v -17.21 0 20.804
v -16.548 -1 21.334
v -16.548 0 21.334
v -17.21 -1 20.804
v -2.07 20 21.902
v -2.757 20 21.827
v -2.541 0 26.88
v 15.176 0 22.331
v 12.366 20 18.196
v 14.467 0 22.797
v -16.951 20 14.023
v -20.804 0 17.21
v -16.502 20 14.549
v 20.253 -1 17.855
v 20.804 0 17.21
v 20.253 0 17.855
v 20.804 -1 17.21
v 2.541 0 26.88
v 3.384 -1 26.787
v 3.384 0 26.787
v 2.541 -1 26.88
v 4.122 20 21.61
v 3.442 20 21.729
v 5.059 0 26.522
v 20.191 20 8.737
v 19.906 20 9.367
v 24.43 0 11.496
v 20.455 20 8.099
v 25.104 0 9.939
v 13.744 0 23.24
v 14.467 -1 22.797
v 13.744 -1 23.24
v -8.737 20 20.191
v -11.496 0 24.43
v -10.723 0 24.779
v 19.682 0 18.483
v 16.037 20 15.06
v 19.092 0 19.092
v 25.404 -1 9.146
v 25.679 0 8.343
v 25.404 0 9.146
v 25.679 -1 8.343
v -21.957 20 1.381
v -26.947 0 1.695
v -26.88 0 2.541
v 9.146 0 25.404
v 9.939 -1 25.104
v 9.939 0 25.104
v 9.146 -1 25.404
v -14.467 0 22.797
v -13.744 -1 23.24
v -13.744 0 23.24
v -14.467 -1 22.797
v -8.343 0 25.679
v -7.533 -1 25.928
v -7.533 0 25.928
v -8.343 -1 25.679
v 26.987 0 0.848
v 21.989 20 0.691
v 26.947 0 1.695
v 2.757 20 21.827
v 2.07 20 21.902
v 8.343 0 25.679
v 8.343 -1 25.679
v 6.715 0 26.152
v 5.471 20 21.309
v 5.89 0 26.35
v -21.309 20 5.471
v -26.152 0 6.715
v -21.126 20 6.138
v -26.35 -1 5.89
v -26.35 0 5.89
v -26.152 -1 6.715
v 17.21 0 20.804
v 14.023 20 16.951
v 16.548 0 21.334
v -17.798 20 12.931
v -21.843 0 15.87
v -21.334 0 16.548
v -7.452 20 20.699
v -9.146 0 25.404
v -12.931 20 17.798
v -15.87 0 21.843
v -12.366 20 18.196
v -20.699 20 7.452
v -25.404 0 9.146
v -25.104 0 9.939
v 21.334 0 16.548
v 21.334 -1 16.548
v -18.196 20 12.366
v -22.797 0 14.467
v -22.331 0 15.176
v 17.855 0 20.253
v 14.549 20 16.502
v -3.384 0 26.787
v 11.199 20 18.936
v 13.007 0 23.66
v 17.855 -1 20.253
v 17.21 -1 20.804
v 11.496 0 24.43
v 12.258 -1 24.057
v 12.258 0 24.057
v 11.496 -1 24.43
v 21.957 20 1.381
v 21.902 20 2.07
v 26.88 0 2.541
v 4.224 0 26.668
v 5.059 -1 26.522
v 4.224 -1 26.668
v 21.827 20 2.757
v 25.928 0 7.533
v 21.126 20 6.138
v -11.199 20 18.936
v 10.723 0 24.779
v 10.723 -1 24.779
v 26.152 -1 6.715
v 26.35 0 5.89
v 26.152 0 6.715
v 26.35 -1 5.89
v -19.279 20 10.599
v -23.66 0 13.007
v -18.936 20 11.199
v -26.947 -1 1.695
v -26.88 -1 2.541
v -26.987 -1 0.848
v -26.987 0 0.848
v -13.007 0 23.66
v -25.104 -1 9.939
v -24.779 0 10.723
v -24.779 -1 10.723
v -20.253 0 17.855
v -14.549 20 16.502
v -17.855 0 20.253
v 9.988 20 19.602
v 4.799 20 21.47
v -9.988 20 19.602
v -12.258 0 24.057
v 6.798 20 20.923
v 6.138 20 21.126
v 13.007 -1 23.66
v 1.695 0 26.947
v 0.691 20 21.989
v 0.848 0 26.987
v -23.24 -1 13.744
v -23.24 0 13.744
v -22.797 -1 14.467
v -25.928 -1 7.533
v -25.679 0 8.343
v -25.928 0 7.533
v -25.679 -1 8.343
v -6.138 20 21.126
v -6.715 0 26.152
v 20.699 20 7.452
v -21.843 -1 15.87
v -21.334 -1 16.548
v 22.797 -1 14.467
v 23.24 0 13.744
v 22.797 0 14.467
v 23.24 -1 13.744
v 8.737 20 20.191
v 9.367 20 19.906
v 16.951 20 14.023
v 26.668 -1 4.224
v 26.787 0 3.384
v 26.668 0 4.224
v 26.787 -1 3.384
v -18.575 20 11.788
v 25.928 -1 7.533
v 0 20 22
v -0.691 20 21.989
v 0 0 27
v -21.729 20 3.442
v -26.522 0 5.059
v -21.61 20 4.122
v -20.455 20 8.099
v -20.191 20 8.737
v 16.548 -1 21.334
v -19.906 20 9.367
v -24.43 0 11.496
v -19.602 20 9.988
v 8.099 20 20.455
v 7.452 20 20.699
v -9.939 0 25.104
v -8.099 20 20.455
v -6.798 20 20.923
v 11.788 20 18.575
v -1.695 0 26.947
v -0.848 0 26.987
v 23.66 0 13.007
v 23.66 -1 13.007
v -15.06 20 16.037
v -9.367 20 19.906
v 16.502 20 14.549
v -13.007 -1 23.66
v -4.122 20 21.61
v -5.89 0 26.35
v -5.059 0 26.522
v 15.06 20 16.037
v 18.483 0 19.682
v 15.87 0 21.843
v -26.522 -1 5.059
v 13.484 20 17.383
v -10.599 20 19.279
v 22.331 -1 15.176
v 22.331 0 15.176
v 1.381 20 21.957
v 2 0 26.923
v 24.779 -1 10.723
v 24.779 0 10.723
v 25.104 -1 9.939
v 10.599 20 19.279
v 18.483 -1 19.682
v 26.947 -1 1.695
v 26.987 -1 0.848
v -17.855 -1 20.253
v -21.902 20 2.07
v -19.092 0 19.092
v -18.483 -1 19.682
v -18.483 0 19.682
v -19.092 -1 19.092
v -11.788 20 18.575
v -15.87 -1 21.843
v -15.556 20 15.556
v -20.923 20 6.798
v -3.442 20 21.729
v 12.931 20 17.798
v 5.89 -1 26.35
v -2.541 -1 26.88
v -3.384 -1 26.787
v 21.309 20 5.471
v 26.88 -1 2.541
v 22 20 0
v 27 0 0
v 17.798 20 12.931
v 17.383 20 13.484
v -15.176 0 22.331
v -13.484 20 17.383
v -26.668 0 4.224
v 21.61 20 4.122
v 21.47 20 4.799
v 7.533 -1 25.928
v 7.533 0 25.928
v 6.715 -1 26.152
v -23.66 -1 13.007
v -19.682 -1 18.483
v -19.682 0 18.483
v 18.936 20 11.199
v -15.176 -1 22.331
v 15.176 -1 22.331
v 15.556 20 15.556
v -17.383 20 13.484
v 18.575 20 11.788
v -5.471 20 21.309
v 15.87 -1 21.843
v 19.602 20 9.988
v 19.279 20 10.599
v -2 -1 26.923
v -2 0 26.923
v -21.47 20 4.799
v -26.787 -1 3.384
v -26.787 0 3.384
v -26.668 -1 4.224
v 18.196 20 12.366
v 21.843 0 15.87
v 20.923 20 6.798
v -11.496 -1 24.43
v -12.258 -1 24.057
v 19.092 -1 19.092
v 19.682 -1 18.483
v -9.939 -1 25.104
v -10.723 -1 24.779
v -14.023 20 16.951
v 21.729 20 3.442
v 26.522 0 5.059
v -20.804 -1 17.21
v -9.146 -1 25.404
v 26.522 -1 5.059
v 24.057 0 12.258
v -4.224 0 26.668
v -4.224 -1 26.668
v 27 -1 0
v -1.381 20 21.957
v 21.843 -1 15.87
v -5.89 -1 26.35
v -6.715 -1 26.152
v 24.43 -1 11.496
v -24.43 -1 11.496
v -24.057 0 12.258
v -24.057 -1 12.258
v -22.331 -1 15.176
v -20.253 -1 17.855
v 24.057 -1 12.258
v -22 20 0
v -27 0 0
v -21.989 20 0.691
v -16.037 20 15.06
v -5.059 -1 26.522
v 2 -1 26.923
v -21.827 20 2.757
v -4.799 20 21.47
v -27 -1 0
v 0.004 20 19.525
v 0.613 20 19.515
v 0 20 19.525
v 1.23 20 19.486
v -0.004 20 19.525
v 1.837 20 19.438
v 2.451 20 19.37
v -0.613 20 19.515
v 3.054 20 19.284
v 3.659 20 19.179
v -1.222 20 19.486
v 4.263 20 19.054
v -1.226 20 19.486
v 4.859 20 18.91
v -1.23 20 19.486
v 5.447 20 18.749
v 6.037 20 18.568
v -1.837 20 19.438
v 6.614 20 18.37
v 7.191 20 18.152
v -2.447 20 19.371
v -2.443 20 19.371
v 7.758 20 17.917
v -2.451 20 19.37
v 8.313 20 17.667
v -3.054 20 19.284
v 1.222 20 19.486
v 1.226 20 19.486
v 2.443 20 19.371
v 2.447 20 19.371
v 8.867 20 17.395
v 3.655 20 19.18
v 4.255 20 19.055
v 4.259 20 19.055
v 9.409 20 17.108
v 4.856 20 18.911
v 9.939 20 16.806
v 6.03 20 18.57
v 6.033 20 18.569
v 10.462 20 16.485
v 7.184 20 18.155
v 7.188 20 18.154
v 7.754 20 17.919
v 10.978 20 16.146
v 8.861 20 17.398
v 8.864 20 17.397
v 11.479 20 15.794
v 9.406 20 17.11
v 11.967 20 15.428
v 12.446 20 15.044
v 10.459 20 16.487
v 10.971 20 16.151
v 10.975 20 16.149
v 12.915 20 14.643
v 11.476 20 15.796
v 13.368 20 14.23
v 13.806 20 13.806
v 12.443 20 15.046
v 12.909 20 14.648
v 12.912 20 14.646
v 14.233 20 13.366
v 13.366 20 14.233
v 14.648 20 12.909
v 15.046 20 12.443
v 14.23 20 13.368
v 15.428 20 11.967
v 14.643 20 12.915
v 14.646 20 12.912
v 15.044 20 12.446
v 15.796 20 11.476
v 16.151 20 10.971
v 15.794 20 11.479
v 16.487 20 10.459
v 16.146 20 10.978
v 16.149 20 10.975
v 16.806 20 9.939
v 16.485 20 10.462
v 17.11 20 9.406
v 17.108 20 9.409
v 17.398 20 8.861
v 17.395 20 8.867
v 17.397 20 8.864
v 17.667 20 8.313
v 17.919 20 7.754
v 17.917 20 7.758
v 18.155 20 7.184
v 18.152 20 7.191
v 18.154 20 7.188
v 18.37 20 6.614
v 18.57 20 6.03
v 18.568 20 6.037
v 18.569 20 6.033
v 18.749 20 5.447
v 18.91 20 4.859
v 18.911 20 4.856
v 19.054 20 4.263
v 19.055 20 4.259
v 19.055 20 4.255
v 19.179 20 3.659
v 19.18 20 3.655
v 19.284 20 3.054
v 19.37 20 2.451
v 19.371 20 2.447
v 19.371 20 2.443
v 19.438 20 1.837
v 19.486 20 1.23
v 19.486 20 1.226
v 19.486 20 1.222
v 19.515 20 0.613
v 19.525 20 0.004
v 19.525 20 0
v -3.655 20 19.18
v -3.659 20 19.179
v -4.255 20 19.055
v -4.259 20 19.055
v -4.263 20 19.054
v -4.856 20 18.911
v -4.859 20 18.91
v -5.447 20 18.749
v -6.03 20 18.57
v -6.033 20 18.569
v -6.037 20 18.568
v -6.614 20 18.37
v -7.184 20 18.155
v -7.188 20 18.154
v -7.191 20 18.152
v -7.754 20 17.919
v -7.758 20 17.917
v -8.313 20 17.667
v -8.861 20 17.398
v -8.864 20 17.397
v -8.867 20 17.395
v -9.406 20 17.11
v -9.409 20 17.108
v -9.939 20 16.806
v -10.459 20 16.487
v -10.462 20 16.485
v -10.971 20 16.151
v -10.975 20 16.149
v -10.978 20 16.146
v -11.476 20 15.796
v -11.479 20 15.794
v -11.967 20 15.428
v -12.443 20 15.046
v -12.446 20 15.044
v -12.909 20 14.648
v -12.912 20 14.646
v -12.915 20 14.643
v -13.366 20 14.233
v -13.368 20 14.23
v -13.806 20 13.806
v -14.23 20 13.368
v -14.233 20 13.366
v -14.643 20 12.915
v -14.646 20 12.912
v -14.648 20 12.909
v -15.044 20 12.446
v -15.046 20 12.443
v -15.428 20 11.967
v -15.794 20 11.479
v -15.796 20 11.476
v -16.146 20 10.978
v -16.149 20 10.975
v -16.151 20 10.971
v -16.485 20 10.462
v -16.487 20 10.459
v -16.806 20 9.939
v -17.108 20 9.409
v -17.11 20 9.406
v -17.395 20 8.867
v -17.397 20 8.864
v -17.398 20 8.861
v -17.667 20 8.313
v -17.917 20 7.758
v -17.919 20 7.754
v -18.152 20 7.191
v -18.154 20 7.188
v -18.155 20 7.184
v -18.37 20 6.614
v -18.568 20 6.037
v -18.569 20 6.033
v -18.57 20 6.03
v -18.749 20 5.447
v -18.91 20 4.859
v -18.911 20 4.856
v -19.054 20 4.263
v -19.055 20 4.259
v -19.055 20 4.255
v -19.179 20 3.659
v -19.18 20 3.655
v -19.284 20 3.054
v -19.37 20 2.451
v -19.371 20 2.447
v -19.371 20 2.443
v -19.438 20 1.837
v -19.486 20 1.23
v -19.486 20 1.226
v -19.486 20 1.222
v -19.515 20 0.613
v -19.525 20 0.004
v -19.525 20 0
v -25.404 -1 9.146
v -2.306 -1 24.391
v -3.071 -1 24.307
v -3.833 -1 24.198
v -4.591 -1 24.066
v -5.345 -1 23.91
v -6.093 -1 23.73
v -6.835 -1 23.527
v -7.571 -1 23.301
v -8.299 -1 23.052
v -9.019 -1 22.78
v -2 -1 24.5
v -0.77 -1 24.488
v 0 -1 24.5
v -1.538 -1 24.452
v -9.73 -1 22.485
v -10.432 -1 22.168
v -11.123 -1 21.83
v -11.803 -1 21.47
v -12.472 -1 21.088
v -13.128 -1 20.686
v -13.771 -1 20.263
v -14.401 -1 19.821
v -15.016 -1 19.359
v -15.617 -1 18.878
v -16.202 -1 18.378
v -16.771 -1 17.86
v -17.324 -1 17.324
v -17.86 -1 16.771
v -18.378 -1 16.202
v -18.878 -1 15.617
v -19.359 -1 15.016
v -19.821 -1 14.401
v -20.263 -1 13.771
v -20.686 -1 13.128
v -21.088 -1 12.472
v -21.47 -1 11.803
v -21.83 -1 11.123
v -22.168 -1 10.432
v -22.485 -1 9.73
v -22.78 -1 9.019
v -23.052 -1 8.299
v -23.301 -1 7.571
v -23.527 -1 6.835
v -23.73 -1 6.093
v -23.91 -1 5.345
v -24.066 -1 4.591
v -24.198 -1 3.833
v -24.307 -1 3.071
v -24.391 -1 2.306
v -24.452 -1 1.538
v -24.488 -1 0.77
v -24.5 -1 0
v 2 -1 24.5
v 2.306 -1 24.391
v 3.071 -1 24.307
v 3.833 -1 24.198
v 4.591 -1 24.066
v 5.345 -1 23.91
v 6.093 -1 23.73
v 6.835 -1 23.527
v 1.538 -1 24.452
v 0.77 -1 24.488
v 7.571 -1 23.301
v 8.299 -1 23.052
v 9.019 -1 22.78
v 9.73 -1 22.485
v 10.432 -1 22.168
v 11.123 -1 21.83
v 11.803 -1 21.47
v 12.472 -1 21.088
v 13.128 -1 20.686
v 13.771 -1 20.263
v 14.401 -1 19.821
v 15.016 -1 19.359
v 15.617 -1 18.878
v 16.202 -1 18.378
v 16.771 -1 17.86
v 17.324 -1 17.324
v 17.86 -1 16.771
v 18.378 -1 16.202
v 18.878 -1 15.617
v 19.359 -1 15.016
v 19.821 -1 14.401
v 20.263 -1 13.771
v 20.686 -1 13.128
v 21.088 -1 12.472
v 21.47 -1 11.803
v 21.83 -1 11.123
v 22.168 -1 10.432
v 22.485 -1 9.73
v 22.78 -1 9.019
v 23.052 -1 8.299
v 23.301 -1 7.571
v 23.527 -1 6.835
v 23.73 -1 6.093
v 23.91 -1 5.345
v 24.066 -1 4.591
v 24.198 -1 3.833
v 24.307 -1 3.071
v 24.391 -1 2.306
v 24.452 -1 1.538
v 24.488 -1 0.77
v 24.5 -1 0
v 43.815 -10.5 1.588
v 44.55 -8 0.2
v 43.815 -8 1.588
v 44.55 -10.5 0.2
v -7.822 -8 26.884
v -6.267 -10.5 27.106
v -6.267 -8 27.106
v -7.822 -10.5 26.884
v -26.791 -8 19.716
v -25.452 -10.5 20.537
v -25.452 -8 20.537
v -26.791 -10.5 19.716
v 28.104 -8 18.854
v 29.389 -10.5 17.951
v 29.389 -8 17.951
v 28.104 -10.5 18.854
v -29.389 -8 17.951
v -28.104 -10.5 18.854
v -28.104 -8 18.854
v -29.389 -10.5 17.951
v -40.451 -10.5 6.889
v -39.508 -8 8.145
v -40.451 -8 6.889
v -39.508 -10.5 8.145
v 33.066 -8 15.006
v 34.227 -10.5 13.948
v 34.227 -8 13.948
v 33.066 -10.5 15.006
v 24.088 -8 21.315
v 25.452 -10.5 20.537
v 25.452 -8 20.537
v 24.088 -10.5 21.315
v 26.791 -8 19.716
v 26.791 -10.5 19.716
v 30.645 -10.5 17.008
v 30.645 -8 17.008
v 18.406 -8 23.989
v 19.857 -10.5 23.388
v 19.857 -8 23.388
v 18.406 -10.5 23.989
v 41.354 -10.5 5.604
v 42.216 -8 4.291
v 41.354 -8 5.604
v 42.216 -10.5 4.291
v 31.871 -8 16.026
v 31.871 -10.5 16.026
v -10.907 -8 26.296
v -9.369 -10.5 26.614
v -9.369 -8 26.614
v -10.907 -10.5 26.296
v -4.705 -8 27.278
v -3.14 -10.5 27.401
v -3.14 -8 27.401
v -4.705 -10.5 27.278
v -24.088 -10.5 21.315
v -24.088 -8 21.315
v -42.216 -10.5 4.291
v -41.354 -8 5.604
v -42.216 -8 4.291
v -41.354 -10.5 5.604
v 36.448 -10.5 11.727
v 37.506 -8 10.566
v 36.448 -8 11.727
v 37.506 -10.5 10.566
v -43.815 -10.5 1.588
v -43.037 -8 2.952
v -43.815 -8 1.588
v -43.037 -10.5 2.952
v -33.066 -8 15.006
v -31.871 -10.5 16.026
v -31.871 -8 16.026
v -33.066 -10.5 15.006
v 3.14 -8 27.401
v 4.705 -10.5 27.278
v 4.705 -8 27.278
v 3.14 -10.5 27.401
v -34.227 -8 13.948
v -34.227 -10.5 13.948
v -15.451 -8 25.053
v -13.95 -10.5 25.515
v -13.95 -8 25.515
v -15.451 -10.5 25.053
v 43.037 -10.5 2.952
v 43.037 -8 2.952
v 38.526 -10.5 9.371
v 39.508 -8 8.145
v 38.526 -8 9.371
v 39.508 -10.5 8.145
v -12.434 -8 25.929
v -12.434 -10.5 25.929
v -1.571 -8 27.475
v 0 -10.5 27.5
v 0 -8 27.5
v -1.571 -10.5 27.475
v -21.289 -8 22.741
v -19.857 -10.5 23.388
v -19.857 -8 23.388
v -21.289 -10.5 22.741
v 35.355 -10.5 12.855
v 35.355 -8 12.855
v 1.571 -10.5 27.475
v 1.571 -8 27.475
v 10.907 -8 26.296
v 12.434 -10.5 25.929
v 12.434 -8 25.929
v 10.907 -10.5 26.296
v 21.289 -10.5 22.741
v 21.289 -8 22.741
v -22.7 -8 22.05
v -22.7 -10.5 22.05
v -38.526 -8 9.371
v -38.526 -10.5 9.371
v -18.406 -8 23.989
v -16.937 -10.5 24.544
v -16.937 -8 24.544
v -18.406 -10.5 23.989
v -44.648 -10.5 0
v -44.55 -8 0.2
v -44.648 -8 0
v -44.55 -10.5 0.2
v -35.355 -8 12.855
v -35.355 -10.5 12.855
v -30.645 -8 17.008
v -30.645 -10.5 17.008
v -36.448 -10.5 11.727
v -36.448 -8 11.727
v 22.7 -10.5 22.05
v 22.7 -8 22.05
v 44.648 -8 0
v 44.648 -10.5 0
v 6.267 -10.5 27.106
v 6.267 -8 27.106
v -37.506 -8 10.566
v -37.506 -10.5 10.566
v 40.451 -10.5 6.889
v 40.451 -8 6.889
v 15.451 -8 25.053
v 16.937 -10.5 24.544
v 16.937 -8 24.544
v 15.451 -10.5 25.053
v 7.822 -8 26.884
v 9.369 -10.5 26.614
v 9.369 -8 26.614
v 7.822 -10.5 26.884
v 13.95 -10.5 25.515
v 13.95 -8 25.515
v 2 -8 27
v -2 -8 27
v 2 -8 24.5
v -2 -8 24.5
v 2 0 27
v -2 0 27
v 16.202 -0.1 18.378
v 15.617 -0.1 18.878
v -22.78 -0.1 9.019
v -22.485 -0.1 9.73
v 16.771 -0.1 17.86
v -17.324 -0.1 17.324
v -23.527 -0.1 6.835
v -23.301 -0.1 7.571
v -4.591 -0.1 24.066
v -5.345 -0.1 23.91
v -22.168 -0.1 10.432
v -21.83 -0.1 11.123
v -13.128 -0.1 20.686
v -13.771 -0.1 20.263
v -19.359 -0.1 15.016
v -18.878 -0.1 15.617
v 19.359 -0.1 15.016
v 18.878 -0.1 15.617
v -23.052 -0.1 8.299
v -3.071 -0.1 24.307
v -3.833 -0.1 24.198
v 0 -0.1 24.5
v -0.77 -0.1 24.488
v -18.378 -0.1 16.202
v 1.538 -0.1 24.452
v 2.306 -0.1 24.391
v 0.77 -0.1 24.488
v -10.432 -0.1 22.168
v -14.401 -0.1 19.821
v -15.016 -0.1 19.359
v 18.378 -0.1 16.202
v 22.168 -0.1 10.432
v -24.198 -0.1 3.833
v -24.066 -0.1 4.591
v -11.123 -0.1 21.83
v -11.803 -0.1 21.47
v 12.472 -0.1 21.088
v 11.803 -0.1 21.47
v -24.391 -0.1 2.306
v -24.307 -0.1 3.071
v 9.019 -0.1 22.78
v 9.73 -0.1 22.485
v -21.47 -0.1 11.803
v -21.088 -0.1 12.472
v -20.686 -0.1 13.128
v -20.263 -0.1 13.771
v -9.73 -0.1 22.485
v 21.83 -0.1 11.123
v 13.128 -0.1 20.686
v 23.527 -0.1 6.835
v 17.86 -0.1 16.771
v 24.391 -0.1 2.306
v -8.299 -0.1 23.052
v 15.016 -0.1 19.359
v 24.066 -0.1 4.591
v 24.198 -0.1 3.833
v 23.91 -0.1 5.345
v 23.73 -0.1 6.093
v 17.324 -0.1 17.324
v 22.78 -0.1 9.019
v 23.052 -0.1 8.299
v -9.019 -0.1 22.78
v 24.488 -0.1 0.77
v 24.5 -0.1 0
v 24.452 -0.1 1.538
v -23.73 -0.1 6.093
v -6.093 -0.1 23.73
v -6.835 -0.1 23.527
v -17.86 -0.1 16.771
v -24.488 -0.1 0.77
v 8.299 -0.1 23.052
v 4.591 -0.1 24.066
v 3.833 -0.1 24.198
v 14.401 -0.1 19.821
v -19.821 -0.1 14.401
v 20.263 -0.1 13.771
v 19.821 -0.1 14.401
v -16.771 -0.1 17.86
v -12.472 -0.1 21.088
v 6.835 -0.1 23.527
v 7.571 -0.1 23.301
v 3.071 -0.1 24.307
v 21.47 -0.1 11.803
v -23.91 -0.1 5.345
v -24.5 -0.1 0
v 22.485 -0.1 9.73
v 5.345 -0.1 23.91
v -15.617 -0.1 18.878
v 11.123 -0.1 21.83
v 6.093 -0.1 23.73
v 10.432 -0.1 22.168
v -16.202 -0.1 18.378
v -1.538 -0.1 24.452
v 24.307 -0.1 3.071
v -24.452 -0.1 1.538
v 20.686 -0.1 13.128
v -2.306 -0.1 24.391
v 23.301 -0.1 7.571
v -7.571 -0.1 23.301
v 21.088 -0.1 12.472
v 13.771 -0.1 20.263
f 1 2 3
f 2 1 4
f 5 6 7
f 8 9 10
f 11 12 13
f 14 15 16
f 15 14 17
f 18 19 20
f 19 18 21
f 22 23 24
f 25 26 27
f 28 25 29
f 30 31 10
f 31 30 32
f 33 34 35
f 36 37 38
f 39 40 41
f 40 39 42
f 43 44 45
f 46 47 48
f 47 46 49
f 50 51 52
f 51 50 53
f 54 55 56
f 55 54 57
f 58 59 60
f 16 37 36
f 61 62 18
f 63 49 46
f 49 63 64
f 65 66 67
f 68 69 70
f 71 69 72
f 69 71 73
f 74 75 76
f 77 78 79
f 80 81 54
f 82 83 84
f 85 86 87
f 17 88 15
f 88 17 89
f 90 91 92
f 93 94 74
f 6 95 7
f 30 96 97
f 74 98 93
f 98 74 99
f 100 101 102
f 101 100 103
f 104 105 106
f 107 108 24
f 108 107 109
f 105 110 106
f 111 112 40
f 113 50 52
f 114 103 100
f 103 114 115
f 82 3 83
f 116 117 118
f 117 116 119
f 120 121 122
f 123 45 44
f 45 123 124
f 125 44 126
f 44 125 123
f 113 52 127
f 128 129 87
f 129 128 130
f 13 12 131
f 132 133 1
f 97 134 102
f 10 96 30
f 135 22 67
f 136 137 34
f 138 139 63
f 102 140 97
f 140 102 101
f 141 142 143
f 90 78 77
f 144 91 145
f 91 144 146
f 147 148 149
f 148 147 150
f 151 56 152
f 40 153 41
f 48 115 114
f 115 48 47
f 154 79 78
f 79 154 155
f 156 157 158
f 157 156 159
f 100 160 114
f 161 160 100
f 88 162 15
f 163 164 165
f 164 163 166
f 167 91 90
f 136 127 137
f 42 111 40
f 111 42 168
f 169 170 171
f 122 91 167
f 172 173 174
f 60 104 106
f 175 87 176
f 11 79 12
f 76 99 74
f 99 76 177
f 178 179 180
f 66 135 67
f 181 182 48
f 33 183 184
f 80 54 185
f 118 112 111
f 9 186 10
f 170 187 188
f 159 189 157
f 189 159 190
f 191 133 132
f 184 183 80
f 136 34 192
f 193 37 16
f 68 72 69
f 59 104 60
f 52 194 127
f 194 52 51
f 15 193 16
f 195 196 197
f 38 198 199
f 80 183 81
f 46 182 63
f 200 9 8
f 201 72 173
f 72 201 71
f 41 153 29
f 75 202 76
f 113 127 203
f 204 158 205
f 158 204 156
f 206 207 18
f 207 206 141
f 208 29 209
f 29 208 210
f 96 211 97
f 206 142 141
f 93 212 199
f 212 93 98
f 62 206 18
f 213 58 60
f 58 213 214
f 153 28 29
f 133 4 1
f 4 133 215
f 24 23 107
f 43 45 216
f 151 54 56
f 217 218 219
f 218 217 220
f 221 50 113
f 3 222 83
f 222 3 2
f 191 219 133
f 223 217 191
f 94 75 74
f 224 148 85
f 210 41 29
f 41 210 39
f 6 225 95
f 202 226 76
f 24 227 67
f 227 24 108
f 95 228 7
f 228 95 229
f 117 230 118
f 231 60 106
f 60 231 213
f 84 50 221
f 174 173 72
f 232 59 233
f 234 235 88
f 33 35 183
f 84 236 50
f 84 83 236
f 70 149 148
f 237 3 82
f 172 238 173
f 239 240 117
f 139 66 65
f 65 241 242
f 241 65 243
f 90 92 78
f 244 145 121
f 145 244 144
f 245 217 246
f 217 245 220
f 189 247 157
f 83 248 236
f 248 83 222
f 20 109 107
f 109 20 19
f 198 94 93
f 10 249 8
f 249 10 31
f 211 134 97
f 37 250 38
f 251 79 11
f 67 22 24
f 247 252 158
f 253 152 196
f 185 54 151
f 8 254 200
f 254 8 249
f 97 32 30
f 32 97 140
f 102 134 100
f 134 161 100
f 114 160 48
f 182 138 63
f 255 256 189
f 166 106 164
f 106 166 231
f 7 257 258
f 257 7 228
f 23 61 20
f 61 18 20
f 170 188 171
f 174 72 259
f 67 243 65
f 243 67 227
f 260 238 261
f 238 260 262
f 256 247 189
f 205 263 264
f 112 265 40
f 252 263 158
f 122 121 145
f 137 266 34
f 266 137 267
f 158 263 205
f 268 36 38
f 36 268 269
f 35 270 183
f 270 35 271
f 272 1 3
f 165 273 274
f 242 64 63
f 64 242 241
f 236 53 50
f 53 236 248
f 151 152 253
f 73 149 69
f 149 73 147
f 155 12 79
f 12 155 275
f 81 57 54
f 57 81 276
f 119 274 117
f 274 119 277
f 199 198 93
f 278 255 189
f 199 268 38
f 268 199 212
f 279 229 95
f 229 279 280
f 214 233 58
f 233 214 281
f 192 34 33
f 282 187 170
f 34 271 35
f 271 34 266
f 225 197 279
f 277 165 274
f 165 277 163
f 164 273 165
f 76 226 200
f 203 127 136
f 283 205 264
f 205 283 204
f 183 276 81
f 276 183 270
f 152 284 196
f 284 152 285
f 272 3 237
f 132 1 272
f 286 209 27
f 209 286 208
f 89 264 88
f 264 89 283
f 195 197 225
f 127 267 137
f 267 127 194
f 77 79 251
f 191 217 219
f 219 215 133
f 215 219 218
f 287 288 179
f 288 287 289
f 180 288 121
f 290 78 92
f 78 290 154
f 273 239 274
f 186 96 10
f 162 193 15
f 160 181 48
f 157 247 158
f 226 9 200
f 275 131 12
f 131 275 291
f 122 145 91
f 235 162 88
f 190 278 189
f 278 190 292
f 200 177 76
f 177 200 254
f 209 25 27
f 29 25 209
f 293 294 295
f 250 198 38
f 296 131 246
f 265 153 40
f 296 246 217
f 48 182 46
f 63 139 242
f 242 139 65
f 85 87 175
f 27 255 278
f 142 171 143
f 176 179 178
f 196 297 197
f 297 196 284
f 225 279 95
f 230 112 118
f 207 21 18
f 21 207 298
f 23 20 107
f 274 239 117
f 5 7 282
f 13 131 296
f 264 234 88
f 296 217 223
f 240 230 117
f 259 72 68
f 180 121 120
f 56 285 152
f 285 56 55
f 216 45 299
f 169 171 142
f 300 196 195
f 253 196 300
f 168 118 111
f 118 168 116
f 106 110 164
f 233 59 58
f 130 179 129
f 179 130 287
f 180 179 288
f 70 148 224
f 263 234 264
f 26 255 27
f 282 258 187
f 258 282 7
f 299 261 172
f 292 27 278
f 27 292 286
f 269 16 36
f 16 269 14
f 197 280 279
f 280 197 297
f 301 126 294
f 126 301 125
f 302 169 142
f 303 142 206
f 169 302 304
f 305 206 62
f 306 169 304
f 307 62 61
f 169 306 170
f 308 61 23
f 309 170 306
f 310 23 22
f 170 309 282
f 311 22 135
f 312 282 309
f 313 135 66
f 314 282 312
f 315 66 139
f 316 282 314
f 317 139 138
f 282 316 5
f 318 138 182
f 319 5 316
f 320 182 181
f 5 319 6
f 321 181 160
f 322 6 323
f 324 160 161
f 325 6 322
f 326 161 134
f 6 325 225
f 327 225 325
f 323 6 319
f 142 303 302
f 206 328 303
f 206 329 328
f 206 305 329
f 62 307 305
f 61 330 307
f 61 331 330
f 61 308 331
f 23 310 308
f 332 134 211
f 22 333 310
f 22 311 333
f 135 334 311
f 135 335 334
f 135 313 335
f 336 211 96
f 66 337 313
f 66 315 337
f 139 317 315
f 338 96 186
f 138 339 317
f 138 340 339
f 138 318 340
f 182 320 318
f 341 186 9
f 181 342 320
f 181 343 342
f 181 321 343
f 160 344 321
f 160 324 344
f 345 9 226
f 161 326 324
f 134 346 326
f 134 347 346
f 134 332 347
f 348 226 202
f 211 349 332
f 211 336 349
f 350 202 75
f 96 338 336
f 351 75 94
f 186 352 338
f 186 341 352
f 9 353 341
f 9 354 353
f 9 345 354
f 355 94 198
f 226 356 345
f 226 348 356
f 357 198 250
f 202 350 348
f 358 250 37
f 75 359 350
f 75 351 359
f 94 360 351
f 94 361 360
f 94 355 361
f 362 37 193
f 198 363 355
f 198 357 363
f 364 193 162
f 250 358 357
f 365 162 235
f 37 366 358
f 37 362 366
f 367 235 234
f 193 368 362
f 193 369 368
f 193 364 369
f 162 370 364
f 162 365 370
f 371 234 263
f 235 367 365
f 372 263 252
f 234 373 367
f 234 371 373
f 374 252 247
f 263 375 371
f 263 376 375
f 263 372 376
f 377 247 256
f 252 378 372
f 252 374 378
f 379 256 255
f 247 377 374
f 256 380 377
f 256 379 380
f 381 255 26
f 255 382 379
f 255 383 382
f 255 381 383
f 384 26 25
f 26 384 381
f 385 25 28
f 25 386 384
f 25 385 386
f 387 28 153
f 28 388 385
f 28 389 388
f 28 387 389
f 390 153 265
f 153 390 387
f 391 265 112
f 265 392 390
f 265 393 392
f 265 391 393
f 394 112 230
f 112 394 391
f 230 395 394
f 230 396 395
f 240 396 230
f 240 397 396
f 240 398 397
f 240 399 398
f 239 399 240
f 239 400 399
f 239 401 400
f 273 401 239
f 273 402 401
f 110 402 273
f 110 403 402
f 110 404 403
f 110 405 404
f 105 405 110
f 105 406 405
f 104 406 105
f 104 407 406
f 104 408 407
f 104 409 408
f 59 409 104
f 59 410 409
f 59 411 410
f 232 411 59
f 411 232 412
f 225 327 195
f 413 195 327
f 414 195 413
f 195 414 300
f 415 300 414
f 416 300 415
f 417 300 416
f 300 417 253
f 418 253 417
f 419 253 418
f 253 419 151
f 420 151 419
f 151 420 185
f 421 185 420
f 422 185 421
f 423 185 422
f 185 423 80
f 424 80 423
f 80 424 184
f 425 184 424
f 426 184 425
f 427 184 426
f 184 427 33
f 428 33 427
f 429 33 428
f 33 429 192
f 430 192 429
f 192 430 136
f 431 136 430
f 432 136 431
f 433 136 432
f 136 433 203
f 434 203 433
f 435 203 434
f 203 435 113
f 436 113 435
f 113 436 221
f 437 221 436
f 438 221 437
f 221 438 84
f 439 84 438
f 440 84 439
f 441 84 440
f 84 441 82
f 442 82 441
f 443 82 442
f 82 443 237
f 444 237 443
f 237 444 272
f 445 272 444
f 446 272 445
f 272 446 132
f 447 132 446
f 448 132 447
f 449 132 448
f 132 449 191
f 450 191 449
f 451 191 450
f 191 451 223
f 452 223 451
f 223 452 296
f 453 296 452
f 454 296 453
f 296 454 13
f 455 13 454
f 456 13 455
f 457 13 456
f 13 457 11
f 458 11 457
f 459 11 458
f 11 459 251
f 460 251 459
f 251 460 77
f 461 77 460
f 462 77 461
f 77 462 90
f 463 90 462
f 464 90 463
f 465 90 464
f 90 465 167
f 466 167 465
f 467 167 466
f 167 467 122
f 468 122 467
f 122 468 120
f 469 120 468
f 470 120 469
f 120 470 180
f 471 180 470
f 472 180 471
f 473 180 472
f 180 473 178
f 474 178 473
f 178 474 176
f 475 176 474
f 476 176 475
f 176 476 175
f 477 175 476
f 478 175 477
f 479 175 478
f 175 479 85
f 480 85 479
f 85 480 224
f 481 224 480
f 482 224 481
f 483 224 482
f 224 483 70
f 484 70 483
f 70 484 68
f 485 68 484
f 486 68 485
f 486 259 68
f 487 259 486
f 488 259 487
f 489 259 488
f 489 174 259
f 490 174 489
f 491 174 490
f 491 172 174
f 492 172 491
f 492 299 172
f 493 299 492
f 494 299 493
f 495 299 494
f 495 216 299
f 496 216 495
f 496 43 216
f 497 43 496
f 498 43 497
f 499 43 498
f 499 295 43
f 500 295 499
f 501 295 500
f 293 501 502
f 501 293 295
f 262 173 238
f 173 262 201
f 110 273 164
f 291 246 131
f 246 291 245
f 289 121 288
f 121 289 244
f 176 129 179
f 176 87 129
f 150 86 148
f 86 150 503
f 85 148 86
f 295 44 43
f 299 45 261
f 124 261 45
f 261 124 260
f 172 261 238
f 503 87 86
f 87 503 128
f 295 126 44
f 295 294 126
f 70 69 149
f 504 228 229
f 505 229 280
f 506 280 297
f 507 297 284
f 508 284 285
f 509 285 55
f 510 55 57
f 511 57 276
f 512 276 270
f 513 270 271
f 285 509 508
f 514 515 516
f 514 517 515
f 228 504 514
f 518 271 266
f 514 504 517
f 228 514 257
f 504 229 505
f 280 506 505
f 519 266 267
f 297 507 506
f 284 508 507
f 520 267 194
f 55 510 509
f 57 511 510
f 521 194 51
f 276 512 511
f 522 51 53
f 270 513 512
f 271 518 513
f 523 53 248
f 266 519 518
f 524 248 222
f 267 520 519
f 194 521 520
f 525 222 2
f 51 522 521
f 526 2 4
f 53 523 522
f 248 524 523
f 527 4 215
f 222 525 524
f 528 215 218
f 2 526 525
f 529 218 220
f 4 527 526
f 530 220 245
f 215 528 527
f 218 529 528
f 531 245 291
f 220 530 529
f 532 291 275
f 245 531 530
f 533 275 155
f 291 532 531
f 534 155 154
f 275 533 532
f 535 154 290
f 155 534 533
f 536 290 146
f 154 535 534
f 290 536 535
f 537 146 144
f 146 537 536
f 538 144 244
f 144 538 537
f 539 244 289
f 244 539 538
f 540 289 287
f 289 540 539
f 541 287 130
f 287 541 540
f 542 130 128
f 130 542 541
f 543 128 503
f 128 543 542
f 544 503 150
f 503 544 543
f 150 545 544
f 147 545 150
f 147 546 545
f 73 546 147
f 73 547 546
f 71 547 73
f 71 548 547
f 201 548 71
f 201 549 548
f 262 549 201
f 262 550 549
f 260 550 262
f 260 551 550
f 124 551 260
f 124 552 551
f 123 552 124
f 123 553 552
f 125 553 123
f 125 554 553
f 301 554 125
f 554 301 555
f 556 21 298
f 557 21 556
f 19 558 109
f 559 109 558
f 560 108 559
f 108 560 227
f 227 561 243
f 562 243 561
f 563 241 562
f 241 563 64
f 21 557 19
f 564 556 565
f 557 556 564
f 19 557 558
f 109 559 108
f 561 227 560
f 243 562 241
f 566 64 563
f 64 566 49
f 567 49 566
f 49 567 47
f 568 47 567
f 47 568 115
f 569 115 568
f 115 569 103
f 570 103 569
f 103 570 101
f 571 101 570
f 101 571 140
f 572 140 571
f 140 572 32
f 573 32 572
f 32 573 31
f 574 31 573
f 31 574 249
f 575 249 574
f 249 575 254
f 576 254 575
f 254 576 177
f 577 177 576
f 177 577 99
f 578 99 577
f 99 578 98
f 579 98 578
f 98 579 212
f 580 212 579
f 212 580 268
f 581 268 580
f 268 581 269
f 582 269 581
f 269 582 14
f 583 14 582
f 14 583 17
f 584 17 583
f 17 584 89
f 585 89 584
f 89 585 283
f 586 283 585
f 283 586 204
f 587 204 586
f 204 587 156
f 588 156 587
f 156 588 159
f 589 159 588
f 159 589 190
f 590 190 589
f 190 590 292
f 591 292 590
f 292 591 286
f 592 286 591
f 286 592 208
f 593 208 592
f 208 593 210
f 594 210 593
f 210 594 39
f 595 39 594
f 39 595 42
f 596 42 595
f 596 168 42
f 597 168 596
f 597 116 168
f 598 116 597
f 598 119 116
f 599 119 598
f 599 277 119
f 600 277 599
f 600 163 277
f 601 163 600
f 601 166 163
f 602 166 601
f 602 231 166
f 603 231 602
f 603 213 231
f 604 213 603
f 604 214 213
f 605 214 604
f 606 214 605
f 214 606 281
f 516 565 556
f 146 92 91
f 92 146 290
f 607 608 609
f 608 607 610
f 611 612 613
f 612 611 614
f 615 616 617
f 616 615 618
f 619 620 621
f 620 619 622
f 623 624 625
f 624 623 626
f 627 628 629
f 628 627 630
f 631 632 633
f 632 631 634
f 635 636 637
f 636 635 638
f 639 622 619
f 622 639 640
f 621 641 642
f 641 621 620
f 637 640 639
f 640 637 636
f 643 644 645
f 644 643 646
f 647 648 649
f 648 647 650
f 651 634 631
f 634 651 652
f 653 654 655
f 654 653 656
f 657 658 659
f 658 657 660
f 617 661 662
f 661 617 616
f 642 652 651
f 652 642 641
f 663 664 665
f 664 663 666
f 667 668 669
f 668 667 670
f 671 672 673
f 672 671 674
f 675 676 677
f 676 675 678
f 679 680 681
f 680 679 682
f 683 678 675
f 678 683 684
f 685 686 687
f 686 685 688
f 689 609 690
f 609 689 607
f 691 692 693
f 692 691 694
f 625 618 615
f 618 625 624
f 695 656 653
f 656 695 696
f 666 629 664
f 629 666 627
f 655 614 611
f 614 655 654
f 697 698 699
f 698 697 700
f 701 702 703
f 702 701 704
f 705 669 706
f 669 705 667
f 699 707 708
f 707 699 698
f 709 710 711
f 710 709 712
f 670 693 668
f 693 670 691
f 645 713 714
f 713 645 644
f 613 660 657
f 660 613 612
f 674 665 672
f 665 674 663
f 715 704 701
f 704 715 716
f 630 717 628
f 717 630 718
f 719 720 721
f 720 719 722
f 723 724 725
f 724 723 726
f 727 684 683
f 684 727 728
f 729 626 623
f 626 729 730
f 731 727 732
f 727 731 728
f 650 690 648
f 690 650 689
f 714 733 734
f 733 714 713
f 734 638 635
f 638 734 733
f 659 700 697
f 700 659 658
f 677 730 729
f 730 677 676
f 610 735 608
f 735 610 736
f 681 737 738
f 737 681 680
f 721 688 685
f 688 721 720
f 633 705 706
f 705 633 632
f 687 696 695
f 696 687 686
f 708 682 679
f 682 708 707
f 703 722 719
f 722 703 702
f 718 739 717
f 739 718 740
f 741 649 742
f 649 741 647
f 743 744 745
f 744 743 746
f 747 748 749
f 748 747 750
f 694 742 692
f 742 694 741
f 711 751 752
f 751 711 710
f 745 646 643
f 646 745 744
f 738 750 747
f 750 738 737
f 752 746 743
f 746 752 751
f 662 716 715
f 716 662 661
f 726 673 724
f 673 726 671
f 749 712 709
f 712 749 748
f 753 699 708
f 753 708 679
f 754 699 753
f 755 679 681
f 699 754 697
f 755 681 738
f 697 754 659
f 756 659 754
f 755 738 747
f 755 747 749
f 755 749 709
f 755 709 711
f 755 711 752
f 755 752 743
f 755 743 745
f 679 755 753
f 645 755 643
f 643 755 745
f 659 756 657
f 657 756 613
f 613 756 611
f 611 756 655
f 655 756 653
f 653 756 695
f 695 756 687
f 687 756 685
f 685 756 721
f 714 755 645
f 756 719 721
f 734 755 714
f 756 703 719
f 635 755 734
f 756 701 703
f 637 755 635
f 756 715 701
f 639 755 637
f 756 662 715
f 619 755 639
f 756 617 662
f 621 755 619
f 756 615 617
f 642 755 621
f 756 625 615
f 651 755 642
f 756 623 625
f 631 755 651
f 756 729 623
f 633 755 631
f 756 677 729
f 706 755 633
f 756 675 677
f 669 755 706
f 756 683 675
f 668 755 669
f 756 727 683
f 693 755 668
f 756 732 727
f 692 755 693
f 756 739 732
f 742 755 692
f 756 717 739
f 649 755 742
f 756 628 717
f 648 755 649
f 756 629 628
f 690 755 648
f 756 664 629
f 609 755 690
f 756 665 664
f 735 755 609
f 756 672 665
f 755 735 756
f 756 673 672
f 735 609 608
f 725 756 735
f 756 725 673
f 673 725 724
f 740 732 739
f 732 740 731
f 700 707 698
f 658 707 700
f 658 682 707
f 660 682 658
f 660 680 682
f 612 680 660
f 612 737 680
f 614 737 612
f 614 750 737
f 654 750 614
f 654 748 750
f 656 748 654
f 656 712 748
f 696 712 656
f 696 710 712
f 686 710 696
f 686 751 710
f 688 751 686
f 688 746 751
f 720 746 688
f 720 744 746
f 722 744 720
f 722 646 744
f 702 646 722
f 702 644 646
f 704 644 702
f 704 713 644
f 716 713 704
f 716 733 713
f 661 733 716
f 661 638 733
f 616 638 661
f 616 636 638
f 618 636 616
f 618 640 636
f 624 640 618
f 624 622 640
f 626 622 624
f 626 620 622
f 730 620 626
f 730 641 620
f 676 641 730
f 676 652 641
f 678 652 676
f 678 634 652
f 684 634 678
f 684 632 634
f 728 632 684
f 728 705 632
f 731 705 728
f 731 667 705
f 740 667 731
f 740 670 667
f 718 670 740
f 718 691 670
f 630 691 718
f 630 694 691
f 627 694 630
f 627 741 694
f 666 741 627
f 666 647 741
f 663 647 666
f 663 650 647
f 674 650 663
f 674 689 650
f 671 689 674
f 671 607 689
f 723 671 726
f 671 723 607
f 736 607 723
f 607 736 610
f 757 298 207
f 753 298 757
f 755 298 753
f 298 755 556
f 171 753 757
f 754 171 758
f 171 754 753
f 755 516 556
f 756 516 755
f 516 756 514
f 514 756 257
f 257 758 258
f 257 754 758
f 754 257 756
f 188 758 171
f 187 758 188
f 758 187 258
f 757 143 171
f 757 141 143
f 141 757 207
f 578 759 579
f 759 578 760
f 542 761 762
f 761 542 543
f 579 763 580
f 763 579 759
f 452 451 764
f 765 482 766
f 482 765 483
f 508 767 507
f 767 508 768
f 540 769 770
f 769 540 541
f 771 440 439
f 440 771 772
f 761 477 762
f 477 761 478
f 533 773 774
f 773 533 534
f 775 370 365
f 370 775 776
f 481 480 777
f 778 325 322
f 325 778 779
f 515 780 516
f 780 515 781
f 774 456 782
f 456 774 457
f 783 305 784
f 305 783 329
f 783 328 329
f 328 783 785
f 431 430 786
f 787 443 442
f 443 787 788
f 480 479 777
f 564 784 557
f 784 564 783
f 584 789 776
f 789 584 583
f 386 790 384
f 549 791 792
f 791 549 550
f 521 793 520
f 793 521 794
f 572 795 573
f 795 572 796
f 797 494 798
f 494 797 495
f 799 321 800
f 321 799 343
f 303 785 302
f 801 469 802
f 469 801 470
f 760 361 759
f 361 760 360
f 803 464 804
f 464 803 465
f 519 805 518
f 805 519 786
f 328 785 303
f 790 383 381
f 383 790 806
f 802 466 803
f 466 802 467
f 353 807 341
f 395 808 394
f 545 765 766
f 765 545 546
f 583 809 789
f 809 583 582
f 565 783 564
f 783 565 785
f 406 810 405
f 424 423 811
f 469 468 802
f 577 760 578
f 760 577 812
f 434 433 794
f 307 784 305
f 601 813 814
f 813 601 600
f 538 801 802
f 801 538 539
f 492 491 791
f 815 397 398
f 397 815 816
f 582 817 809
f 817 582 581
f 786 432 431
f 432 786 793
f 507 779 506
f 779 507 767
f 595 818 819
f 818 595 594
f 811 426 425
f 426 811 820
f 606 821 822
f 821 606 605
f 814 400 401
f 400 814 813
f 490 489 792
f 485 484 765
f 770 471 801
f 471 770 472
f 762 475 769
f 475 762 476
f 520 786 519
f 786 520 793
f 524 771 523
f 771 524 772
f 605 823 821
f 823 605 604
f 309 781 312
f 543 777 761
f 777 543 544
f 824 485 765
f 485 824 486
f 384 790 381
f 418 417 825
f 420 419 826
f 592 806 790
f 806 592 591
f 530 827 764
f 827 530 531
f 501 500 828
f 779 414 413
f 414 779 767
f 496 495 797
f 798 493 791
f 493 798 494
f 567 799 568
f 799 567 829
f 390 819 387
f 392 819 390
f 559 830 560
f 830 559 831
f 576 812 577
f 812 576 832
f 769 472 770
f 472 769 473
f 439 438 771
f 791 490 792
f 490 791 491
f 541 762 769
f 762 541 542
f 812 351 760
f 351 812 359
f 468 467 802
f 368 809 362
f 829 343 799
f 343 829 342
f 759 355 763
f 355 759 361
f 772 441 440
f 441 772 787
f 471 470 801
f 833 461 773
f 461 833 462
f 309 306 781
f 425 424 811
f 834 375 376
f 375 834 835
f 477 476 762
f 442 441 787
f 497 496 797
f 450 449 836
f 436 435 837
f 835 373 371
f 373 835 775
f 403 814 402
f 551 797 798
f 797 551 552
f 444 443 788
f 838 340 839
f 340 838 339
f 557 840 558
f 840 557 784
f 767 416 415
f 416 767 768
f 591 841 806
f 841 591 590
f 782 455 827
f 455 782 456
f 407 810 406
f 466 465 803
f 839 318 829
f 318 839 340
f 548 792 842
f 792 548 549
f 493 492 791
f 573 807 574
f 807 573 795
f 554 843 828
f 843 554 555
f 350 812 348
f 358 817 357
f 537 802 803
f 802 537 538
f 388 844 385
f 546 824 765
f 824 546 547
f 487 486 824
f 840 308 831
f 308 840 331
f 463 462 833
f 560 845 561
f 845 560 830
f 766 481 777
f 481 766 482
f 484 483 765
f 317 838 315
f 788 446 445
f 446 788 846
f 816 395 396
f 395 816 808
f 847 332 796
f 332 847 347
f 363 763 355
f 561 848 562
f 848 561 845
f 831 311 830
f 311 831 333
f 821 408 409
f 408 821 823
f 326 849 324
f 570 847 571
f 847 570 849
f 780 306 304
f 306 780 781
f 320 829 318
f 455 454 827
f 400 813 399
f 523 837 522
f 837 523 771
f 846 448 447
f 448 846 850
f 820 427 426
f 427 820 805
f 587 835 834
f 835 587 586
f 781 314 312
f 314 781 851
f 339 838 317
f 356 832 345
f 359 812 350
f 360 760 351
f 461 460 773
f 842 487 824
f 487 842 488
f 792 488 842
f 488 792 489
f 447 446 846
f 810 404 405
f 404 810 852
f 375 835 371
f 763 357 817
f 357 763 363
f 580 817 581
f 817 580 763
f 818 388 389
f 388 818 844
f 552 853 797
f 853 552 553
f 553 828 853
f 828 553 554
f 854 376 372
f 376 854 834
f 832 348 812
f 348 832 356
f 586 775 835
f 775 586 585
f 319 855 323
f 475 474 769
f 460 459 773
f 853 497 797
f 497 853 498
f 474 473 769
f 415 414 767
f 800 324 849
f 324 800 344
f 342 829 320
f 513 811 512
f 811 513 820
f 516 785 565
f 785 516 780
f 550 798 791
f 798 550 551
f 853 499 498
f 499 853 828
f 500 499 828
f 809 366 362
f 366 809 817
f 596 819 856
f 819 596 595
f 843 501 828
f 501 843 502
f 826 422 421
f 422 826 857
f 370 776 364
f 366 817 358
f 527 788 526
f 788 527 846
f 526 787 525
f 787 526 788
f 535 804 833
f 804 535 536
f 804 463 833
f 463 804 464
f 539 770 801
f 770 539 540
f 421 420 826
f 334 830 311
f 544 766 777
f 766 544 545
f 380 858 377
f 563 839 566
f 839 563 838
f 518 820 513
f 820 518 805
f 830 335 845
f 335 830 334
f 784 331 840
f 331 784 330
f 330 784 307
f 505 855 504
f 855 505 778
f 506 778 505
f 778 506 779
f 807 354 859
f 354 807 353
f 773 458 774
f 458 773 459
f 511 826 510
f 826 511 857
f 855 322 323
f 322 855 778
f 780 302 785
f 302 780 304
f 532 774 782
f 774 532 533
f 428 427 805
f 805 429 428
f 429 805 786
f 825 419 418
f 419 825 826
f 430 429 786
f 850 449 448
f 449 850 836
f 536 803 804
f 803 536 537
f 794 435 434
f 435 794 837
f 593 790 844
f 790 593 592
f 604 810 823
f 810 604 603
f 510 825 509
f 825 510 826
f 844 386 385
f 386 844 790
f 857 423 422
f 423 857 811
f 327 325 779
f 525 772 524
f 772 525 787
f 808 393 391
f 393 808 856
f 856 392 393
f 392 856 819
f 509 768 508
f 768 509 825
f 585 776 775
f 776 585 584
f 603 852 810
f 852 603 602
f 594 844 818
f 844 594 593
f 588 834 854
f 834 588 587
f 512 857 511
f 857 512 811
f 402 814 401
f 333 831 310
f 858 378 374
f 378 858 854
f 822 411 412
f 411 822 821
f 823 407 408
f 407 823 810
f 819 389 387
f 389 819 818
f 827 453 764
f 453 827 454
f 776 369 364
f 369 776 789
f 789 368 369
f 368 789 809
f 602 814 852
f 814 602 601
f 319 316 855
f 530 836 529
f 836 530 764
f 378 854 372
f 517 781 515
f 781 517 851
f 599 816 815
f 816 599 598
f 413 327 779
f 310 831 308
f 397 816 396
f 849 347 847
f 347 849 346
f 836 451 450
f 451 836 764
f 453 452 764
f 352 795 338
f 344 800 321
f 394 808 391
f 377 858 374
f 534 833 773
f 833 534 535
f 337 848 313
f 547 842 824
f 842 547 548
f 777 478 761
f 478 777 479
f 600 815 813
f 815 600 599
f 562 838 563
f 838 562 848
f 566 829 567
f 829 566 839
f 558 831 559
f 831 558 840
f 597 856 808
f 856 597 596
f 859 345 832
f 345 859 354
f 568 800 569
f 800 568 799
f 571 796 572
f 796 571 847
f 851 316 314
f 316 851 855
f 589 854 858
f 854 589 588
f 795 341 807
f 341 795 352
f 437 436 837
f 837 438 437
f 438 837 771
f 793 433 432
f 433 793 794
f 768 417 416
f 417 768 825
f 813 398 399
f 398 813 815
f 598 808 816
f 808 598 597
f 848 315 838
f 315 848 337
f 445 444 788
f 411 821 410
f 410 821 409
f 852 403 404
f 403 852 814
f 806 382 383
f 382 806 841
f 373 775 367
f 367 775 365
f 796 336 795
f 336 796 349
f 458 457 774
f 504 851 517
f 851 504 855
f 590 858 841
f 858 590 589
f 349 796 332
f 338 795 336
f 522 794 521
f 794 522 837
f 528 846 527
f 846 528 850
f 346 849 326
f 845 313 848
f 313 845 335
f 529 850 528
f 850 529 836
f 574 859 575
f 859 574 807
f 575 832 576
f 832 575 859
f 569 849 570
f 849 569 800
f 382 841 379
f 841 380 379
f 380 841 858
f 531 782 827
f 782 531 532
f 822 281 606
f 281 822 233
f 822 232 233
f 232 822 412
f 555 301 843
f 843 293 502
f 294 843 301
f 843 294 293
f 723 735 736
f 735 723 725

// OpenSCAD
// file: ../sc.scad
// ShortCuts.scad 
// Autor: Rudolf Huttary, Berlin 2015
//
$fn = 100; 

//show_examples(); 

module show_examples()
	place_in_rect(30, 30)
	{
		Cy(h = 10); 
		CyH(h = 10); 
		CyH(h = 10, w = 30); 
		CyS(h = 10); 
		CyS(h = 10, w1 = 25, w2 = 75); 
		Cu(10); 
		Ri(h = 10); 
		RiH(h = 10); 
		RiS(h = 10, w1 = 10); 
		RiS(h = 10, w1 = 30, w2 = 300); 
		Sp(); 
		SpH(10, 30, 30); 
	}


module help()
{
echo("==============="); 
echo("help(): shows this help"); 
echo("show_examples(): shows some examples"); 
echo("place_in_rect(): places children objects in grid"); 
echo("Transformations:"); 
echo(" transform :  T(x=0, y=0, z=0), Tx(x=0) , Ty(y=0), Tz(z=0)"); 
echo(" rotate :  R(x=0, y=0, z=0), Rx(x=0) , Ry(y=0), Rz(z=0)"); 
echo(" scale :  S(x=1, y=1, z=1), Sx(x=1) , Sy(y=1), Sz(z=1)"); 
echo("Logical"); 
echo(" difference :  D()"); 
echo(" union :  U()"); 
echo(" intersection : *missing*"); 
echo("Primitives"); 
echo(" circle :  Ci(r=10)"); 
echo(" circle_half :  CiH(r=10, w=0)")
echo(" circle_segment :  CiS(r=10, w1=0, w2=90)")
echo(" square :  Sq(x=10, y=0, center=true))"); 
echo(" cylinder :  Cy(r=10, h=1, center=true)"); 
echo(" cylinder_half :  CyH(r=10, w=0)")
echo(" cylinder_segment: CyS(r=10, h=1, w1=0, w2=90,center=true)"); 
echo(" cylinder_segment: Pie(r=10, h=1, w1=0, w2=90,center=true)"); 
echo(" cube :  Cu(x=10, y=0, z=10, center=true)"); 
echo(" ring :  Ri(R=10, r=5, h=1, center=true)"); 
echo(" ring_half :  RiH(R=10, r=5, h=1, w=0 center=true)"); 
echo(" ring_segment :  RiS(R=10, r=5, h=1, w1=0, w2=90, center=true)"); 
echo(" sphere:  Sp(r=10))"); 
echo(" sphere_half:  SpH(r=10, w1 = 0, w2 = 0))"); 
echo("==============="); 
}

// Euclidean Transformations
module T(x=0, y=0, z=0){translate([x, y, z])children(); }
module Tx(x) { translate([x, 0, 0])children(); }
module Ty(y) { translate([0, y, 0])children(); }
module Tz(z) { translate([0, 0, z])children(); }

module R(x=0, y=0, z=0){rotate([x, y, z]) children();}
module Rx(x=90){rotate([x, 0, 0]) children();}
module Ry(y=90){rotate([0, y, 0]) children();}
module Rz(z=90){rotate([0, 0, z]) children();}

module M(x=0, y=0, z=0){mirror([x, y, z]) children();}
module Mx(x=1){mirror([x, 0, 0]) children();}
module My(y=1){mirror([0, y, 0]) children();}
module Mz(z=1){mirror([0, 0, z]) children();}

module S(x=1, y=1, z=1){scale([x, y, z]) children();}
module Sx(x=1){scale([x, 1, 1]) children();}
module Sy(y=1){scale([1, y, 1]) children();}
module Sz(z=1){scale([1, 1, z]) children();}

module D() difference(){children(0); children([1:$children-1]);}
module U() children([0:$children-1]);
// module I() intersection()children([0:$children-1]); // does not work for some reason


// primitives - 2D

module Sq(x =10, y = 0, center = false)
{
   if(y==0)
		square([x, x], center = center); 
	else
		square([x, y], center = center); 
}
module Ci(r = 10)
{
	circle(r = r); 
}

// derived primitives - 2d
module CiH(r = 10, w = 0)
  circle_half(r, w); 

module CiS(r = 10, w1 = 0, w2 = 90)
  circle_segment(r, w1, w2); 


// primitives - 3d
module Cy(r = 10, h = 1, center = false)
{
	cylinder(r = r, h = h, center = center); 
}
module Cu(x = 10, y = 0, z = 10, center = false)
{
  if (y==0)
	cube([x, x, x], center = center); 
  else
	cube([x, y, z], center = center); 
}

// derived primitives - 3d
module CyH(r = 10, h = 1, w = 0, center = false)
  cylinder_half(r, h, w, center); 

module CyS(r = 10, h = 1, w1 = 0, w2 = 90, center = false)
  cylinder_segment(r, h, w1, w2, center); 

module Ri(R = 10, r = 5, h = 1, center = false)
  ring(R, r, h, center); 

module RiS(R = 10, r = 5, h = 1, w1 = 0, w2 = 90, center = false)
   ring_segment(R, r, h, w1, w2, center); 

module RiH(r1 = 10, r2, h = 1, w = 0, center = false)
   ring_half(r1, r2, h, w, center); 
module Pie(r = 10, h = 1, w1 = 0, w2 = 90, center = false)
  cylinder_segment(r, h, w1, w2, center);  
module Sp(r = 10)
  sphere(r); 
module SpH(r = 10, w1 = 0, w2 = 0)
  sphere_half(r, w1, w2); 
module SpS(r = 10, w1 = 0, w2 = 90, w3 = 90)
  sphere_segment(r, w1, w2); 




// clear text definitions
module circle_half(r = 10, w = 0)
{
	difference()
	{
		circle(r); 
     rotate([0, 0, w-90])
     translate([0, -r])
		square([r, 2*r], center = false); 
	}
}

module circle_segment(r = 10, w1 = 0, w2 = 90)
{
  W2 = (w1>w2)?w2+360:w2; 
  if (W2-w1 < 180)
    intersection()
		{
       circle_half(r, w1); 
       circle_half(r, W2-180); 
 		}
	else
    union()
		{
       circle_half(r, w1); 
       circle_half(r, W2-180); 
 		}
}

module cylinder_half(r = 10, h = 1, w = 0, center = true)
{
  linear_extrude(height = h, center = center)
  circle_half(r, w); 
} 

module cylinder_segment(r = 10, h = 1, w1 = 0, w2 = 90, center = true)
{
  linear_extrude(height = h, center = center)
  circle_segment(r, w1, w2); 
} 

module ring(R = 10, r = 5, h = 1, center = true)
{
	difference()
	{
	cylinder(r = R, h = h, center = center); 
   translate([0, 0, -2*h])
	cylinder(r = r, h = 4*h, center = false); 
	}
}

module ring_half(R = 10, r = 5, h = 1, w = 0, center = true)
{
	difference()
	{
		ring(R, r, h, center); 
     rotate([0, 0, w])
     translate([0, -R/2, 0])
		cube([2*R, R, 3*h], center = true); 
	}
}

module ring_segment(R = 10, r = 5, h = 1, w1 = 0, w2 = 90, center = true)
{
  W2 = (w1>w2)?w2+360:w2; 
  if (W2-w1 < 180)
    intersection()
		{
       ring_half(R, r, h, w1, center); 
       ring_half(R, r, h, W2-180, center); 
 		}
	else
    union()
		{
       ring_half(R, r, h, w1, center); 
       ring_half(R, r, h, W2-180, center); 
 		}
}


module sphere_half(r = 10, w1 = 0, w2 = 0)
{  
	difference()
	{
   	sphere(r); 
      rotate([-w1, -w2, 0])
     	translate([0, 0, r])
		cube([2*r, 2*r, r], center = true); 
	}

}


// additional code
module place_in_rect(dx =20, dy=20)
{
  cols = ceil(sqrt($children)); 
  rows = floor(sqrt($children)); 
  for(i = [0:$children-1])
	{ 
	  T(dx*(-cols/2+(i%cols)+.5), dy*(rows/2-floor(i/cols)-.5))
		 children(i); 
	}
}
// main file
use <../lib.scad>
$fn=200;

uw= 44;
lw=54;
uh=1;
lh=10;
sh=100;
nd=20;
t=2.5;

difference(){
    union(){
        hull(){
            translate([0,nd,0])
            rotate([90,0,0])
            cylinder(d=uw, h=1);

            rotate([90,0,0])
            cylinder(d=lw, h=1);
        }

        translate([0,-8,-(sh/2-lh/2)/2])
        rotate([90,0,0])
        cylinder(d=sh, h=t);

        translate([-2,-8,lw/2-t])
        cube([4,8,t]);
    }

    // Inner
    hull(){
        translate([0,nd+.1,0])
        rotate([90,0,0])
        cylinder(d=uw-t*2, h=1);

        translate([0,-.1,0])
        rotate([90,0,0])
        cylinder(d=lw-t*2, h=1);
    }

    // Cut Bottom
    translate([-sh,-sh/2,-sh])
    cube([sh*2,sh,sh]);
}
